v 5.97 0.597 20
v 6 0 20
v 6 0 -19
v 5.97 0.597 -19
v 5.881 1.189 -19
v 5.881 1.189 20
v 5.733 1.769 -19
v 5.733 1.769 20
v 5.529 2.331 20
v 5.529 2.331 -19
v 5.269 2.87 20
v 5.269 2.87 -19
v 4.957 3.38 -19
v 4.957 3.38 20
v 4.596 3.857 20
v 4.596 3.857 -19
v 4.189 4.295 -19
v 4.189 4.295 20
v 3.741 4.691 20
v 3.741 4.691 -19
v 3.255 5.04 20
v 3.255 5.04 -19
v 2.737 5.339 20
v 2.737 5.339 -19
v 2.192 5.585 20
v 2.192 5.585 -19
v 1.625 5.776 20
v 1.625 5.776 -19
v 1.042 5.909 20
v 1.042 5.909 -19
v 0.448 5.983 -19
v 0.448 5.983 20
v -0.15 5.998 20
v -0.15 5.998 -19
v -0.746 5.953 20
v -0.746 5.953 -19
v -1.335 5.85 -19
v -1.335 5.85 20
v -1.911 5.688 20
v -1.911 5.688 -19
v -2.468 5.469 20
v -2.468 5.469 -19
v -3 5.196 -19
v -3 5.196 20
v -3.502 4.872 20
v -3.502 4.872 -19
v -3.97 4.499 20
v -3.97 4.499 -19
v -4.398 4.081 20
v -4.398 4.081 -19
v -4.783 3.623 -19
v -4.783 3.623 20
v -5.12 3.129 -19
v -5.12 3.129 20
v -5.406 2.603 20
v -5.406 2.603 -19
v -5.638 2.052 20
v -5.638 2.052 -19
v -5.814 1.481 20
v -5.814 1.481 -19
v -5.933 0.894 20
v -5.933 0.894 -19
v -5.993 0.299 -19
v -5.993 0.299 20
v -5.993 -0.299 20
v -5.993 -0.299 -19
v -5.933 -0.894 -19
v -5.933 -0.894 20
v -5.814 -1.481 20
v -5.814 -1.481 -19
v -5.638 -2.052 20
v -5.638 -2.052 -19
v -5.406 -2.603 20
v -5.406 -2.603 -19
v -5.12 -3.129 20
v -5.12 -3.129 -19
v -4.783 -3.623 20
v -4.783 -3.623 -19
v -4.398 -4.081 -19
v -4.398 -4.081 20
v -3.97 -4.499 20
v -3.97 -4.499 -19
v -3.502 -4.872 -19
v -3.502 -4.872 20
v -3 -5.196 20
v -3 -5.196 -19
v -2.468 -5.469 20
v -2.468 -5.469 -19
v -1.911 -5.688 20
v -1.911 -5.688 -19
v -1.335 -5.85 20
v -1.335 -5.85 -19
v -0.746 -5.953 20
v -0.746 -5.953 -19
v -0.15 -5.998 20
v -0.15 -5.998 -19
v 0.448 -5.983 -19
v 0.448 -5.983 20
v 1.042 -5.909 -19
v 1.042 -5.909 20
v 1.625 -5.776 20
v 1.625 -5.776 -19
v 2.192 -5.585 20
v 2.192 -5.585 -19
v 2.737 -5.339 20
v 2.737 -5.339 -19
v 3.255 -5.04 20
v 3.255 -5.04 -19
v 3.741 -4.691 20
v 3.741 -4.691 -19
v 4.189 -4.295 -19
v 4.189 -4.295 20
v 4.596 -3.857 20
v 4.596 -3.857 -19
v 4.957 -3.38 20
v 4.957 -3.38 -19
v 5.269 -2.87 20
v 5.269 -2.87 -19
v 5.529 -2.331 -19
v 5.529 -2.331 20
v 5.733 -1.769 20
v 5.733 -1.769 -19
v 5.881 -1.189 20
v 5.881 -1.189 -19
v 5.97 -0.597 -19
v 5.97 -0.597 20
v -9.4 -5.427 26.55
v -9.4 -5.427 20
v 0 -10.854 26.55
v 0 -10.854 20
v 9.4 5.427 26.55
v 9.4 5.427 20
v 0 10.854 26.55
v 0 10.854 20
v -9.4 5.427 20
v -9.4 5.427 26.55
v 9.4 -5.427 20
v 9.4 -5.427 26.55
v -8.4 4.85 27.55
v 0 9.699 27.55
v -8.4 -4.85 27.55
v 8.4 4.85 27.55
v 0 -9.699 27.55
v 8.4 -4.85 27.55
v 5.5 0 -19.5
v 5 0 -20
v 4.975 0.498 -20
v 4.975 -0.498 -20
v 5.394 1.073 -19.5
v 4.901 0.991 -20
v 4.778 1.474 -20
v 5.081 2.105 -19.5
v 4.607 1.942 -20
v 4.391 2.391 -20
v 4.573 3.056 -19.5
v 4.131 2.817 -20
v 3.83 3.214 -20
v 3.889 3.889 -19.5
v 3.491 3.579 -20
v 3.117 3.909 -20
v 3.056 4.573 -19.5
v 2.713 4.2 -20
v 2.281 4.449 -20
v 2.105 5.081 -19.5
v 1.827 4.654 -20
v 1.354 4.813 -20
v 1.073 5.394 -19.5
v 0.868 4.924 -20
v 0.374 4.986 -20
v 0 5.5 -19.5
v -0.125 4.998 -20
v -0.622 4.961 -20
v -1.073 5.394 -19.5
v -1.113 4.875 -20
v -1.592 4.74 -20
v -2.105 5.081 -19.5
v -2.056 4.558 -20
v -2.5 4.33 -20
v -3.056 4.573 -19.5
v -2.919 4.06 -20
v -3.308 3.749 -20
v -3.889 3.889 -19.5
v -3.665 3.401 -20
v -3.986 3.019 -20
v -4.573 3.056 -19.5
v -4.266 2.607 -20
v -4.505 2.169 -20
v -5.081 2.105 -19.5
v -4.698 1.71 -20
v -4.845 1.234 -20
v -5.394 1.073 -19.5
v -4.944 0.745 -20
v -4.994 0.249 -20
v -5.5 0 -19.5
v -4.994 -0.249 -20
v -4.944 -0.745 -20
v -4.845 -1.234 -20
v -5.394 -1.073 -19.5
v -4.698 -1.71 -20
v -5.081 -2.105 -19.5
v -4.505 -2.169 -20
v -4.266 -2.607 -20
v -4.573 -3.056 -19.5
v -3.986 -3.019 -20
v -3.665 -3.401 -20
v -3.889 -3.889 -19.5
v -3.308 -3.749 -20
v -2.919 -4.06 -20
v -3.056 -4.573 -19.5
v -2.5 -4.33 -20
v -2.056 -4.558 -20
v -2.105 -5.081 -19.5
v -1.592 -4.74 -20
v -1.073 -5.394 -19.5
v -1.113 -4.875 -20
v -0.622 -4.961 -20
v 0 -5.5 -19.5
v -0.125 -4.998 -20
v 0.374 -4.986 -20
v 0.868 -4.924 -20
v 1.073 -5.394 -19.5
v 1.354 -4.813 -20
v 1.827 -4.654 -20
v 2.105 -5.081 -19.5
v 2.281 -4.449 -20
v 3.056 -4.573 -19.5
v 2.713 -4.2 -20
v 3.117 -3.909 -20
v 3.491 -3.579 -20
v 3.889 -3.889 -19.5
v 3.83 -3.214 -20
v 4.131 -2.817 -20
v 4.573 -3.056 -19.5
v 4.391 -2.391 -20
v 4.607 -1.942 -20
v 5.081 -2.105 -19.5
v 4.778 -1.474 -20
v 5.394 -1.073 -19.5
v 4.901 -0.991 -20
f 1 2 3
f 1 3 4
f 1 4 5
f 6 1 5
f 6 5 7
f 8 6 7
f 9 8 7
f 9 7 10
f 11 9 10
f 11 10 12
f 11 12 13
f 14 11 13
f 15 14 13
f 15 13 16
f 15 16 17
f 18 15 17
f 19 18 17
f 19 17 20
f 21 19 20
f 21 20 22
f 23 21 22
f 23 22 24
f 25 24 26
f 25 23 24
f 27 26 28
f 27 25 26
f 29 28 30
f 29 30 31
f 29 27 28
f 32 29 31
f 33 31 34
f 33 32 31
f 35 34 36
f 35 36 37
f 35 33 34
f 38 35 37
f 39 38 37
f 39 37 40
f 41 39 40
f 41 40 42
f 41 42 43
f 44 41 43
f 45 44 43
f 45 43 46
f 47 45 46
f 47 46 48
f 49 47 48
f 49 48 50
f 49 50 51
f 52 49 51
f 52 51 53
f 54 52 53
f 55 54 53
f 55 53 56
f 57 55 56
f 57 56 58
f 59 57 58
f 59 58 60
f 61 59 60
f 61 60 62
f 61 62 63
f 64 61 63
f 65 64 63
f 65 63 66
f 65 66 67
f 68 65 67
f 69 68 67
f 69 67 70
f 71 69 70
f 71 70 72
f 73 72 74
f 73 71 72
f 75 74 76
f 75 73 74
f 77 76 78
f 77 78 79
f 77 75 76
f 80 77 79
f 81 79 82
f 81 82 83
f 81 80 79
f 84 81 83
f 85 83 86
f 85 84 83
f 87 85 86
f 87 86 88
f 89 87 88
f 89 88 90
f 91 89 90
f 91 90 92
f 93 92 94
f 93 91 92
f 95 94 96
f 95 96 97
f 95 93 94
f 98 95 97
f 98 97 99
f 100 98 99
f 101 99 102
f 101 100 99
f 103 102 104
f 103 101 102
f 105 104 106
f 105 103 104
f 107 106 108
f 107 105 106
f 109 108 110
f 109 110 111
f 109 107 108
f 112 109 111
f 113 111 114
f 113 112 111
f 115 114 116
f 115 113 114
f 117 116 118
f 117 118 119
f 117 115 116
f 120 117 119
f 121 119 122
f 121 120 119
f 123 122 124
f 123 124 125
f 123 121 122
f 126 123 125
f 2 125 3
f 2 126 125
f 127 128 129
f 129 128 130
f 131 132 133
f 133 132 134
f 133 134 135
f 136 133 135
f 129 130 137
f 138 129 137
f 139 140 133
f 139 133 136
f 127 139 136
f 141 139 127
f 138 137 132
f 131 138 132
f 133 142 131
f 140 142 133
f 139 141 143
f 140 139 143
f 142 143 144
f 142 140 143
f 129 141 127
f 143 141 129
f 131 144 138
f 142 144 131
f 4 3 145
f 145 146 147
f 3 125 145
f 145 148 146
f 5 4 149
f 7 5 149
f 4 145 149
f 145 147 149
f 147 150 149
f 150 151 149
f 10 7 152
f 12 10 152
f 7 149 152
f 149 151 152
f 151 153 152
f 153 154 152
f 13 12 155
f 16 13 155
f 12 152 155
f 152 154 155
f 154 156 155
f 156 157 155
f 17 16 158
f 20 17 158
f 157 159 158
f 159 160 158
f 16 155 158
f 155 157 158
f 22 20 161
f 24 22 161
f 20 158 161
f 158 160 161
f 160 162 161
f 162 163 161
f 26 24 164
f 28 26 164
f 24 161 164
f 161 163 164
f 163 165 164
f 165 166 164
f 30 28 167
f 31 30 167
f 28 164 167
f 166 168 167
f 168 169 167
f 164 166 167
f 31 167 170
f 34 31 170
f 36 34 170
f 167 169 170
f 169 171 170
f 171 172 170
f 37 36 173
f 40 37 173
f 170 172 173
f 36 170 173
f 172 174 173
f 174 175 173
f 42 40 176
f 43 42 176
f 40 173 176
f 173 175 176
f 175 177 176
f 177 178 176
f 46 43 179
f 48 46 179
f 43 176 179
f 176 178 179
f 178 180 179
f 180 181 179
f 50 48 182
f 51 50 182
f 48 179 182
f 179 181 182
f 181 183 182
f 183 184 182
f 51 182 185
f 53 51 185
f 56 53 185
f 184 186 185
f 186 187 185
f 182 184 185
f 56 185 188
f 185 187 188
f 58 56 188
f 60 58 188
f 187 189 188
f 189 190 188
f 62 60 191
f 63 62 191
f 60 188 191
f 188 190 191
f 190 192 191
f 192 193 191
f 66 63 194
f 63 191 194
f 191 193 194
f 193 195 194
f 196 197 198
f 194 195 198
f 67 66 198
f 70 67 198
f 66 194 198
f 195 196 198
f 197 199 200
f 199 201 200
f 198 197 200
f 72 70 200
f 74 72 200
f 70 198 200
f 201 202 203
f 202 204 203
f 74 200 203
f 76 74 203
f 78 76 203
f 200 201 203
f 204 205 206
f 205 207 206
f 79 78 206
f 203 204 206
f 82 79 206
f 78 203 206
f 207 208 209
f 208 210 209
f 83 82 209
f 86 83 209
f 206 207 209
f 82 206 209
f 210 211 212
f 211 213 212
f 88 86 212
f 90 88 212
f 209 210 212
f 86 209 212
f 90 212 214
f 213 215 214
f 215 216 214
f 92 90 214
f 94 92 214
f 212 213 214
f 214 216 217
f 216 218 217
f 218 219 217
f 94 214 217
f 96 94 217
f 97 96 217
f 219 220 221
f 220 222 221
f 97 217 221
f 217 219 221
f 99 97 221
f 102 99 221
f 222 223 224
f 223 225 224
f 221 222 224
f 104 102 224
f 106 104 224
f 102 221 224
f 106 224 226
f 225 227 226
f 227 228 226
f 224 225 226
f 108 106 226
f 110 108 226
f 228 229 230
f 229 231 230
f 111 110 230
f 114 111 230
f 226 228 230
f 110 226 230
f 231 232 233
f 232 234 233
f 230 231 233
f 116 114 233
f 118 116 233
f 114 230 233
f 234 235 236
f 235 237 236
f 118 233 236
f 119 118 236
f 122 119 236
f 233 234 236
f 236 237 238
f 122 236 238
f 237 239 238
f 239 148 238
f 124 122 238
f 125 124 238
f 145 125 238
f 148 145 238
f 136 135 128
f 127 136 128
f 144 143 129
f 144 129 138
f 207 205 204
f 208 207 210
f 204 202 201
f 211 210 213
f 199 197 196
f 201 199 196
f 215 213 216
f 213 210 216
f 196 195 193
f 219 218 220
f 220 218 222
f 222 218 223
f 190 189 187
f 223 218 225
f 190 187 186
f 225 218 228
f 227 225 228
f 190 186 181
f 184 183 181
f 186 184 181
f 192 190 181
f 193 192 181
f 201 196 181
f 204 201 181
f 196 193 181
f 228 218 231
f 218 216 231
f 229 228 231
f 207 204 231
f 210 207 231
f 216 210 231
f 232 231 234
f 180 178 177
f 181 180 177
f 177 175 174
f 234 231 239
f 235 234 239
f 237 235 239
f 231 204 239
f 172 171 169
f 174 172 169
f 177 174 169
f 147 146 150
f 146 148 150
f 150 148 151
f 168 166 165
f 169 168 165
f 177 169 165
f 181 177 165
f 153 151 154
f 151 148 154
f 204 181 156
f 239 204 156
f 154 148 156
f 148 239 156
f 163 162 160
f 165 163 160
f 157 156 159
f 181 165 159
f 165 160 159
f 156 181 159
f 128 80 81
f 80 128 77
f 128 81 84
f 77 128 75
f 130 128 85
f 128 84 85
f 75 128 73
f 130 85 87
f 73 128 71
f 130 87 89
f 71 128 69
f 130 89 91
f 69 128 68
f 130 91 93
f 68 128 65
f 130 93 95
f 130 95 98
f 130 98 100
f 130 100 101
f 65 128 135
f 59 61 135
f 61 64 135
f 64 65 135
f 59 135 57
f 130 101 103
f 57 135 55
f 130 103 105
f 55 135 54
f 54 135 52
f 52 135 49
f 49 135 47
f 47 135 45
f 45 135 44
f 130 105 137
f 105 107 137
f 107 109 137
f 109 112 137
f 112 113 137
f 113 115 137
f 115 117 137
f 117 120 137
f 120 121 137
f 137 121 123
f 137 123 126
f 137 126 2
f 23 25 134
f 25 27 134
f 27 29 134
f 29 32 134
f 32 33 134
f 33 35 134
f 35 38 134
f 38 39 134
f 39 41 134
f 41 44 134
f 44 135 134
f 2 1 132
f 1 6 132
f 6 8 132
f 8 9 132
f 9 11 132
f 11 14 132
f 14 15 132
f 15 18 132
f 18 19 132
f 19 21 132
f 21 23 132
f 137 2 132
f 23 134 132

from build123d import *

# Parameters (mm, degrees)
F0_R     = 6
F1_DEPTH = 20
F3_DEPTH = 7.55
F4_SIZE  = 1
F5_SIZE  = 1


with BuildPart() as f1:
    # F0 (on Top) → F1 (new body, symmetric)
    with BuildSketch(Plane.XY):
        Circle(F0_R)
    extrude(amount=F1_DEPTH, both=True)

    # F2 (on face) → F3 (join)
    with BuildSketch(Plane.XY.offset(20)):
        Polygon((0, 10.854185), (-9.4, 5.427093), (-9.4, -5.427093), (0, -10.854185), (9.4, -5.427093), (9.4, 5.427093), align=None)
    extrude(amount=F3_DEPTH)

    # F4
    f4_edges = [f1.edges().sort_by_distance(p)[0] for p in [
        (-6, 0, -20),
    ]]
    chamfer(f4_edges, length=F4_SIZE)

    # F5
    f5_edges = [f1.edges().sort_by_distance(p)[0] for p in [
        (4.7, 8.140639, 27.55),
        (-4.7, 8.140639, 27.55),
        (-9.4, 0, 27.55),
        (-4.7, -8.140639, 27.55),
        (4.7, -8.140639, 27.55),
        (9.4, 0, 27.55),
    ]]
    chamfer(f5_edges, length=F5_SIZE)


solid = f1.part
